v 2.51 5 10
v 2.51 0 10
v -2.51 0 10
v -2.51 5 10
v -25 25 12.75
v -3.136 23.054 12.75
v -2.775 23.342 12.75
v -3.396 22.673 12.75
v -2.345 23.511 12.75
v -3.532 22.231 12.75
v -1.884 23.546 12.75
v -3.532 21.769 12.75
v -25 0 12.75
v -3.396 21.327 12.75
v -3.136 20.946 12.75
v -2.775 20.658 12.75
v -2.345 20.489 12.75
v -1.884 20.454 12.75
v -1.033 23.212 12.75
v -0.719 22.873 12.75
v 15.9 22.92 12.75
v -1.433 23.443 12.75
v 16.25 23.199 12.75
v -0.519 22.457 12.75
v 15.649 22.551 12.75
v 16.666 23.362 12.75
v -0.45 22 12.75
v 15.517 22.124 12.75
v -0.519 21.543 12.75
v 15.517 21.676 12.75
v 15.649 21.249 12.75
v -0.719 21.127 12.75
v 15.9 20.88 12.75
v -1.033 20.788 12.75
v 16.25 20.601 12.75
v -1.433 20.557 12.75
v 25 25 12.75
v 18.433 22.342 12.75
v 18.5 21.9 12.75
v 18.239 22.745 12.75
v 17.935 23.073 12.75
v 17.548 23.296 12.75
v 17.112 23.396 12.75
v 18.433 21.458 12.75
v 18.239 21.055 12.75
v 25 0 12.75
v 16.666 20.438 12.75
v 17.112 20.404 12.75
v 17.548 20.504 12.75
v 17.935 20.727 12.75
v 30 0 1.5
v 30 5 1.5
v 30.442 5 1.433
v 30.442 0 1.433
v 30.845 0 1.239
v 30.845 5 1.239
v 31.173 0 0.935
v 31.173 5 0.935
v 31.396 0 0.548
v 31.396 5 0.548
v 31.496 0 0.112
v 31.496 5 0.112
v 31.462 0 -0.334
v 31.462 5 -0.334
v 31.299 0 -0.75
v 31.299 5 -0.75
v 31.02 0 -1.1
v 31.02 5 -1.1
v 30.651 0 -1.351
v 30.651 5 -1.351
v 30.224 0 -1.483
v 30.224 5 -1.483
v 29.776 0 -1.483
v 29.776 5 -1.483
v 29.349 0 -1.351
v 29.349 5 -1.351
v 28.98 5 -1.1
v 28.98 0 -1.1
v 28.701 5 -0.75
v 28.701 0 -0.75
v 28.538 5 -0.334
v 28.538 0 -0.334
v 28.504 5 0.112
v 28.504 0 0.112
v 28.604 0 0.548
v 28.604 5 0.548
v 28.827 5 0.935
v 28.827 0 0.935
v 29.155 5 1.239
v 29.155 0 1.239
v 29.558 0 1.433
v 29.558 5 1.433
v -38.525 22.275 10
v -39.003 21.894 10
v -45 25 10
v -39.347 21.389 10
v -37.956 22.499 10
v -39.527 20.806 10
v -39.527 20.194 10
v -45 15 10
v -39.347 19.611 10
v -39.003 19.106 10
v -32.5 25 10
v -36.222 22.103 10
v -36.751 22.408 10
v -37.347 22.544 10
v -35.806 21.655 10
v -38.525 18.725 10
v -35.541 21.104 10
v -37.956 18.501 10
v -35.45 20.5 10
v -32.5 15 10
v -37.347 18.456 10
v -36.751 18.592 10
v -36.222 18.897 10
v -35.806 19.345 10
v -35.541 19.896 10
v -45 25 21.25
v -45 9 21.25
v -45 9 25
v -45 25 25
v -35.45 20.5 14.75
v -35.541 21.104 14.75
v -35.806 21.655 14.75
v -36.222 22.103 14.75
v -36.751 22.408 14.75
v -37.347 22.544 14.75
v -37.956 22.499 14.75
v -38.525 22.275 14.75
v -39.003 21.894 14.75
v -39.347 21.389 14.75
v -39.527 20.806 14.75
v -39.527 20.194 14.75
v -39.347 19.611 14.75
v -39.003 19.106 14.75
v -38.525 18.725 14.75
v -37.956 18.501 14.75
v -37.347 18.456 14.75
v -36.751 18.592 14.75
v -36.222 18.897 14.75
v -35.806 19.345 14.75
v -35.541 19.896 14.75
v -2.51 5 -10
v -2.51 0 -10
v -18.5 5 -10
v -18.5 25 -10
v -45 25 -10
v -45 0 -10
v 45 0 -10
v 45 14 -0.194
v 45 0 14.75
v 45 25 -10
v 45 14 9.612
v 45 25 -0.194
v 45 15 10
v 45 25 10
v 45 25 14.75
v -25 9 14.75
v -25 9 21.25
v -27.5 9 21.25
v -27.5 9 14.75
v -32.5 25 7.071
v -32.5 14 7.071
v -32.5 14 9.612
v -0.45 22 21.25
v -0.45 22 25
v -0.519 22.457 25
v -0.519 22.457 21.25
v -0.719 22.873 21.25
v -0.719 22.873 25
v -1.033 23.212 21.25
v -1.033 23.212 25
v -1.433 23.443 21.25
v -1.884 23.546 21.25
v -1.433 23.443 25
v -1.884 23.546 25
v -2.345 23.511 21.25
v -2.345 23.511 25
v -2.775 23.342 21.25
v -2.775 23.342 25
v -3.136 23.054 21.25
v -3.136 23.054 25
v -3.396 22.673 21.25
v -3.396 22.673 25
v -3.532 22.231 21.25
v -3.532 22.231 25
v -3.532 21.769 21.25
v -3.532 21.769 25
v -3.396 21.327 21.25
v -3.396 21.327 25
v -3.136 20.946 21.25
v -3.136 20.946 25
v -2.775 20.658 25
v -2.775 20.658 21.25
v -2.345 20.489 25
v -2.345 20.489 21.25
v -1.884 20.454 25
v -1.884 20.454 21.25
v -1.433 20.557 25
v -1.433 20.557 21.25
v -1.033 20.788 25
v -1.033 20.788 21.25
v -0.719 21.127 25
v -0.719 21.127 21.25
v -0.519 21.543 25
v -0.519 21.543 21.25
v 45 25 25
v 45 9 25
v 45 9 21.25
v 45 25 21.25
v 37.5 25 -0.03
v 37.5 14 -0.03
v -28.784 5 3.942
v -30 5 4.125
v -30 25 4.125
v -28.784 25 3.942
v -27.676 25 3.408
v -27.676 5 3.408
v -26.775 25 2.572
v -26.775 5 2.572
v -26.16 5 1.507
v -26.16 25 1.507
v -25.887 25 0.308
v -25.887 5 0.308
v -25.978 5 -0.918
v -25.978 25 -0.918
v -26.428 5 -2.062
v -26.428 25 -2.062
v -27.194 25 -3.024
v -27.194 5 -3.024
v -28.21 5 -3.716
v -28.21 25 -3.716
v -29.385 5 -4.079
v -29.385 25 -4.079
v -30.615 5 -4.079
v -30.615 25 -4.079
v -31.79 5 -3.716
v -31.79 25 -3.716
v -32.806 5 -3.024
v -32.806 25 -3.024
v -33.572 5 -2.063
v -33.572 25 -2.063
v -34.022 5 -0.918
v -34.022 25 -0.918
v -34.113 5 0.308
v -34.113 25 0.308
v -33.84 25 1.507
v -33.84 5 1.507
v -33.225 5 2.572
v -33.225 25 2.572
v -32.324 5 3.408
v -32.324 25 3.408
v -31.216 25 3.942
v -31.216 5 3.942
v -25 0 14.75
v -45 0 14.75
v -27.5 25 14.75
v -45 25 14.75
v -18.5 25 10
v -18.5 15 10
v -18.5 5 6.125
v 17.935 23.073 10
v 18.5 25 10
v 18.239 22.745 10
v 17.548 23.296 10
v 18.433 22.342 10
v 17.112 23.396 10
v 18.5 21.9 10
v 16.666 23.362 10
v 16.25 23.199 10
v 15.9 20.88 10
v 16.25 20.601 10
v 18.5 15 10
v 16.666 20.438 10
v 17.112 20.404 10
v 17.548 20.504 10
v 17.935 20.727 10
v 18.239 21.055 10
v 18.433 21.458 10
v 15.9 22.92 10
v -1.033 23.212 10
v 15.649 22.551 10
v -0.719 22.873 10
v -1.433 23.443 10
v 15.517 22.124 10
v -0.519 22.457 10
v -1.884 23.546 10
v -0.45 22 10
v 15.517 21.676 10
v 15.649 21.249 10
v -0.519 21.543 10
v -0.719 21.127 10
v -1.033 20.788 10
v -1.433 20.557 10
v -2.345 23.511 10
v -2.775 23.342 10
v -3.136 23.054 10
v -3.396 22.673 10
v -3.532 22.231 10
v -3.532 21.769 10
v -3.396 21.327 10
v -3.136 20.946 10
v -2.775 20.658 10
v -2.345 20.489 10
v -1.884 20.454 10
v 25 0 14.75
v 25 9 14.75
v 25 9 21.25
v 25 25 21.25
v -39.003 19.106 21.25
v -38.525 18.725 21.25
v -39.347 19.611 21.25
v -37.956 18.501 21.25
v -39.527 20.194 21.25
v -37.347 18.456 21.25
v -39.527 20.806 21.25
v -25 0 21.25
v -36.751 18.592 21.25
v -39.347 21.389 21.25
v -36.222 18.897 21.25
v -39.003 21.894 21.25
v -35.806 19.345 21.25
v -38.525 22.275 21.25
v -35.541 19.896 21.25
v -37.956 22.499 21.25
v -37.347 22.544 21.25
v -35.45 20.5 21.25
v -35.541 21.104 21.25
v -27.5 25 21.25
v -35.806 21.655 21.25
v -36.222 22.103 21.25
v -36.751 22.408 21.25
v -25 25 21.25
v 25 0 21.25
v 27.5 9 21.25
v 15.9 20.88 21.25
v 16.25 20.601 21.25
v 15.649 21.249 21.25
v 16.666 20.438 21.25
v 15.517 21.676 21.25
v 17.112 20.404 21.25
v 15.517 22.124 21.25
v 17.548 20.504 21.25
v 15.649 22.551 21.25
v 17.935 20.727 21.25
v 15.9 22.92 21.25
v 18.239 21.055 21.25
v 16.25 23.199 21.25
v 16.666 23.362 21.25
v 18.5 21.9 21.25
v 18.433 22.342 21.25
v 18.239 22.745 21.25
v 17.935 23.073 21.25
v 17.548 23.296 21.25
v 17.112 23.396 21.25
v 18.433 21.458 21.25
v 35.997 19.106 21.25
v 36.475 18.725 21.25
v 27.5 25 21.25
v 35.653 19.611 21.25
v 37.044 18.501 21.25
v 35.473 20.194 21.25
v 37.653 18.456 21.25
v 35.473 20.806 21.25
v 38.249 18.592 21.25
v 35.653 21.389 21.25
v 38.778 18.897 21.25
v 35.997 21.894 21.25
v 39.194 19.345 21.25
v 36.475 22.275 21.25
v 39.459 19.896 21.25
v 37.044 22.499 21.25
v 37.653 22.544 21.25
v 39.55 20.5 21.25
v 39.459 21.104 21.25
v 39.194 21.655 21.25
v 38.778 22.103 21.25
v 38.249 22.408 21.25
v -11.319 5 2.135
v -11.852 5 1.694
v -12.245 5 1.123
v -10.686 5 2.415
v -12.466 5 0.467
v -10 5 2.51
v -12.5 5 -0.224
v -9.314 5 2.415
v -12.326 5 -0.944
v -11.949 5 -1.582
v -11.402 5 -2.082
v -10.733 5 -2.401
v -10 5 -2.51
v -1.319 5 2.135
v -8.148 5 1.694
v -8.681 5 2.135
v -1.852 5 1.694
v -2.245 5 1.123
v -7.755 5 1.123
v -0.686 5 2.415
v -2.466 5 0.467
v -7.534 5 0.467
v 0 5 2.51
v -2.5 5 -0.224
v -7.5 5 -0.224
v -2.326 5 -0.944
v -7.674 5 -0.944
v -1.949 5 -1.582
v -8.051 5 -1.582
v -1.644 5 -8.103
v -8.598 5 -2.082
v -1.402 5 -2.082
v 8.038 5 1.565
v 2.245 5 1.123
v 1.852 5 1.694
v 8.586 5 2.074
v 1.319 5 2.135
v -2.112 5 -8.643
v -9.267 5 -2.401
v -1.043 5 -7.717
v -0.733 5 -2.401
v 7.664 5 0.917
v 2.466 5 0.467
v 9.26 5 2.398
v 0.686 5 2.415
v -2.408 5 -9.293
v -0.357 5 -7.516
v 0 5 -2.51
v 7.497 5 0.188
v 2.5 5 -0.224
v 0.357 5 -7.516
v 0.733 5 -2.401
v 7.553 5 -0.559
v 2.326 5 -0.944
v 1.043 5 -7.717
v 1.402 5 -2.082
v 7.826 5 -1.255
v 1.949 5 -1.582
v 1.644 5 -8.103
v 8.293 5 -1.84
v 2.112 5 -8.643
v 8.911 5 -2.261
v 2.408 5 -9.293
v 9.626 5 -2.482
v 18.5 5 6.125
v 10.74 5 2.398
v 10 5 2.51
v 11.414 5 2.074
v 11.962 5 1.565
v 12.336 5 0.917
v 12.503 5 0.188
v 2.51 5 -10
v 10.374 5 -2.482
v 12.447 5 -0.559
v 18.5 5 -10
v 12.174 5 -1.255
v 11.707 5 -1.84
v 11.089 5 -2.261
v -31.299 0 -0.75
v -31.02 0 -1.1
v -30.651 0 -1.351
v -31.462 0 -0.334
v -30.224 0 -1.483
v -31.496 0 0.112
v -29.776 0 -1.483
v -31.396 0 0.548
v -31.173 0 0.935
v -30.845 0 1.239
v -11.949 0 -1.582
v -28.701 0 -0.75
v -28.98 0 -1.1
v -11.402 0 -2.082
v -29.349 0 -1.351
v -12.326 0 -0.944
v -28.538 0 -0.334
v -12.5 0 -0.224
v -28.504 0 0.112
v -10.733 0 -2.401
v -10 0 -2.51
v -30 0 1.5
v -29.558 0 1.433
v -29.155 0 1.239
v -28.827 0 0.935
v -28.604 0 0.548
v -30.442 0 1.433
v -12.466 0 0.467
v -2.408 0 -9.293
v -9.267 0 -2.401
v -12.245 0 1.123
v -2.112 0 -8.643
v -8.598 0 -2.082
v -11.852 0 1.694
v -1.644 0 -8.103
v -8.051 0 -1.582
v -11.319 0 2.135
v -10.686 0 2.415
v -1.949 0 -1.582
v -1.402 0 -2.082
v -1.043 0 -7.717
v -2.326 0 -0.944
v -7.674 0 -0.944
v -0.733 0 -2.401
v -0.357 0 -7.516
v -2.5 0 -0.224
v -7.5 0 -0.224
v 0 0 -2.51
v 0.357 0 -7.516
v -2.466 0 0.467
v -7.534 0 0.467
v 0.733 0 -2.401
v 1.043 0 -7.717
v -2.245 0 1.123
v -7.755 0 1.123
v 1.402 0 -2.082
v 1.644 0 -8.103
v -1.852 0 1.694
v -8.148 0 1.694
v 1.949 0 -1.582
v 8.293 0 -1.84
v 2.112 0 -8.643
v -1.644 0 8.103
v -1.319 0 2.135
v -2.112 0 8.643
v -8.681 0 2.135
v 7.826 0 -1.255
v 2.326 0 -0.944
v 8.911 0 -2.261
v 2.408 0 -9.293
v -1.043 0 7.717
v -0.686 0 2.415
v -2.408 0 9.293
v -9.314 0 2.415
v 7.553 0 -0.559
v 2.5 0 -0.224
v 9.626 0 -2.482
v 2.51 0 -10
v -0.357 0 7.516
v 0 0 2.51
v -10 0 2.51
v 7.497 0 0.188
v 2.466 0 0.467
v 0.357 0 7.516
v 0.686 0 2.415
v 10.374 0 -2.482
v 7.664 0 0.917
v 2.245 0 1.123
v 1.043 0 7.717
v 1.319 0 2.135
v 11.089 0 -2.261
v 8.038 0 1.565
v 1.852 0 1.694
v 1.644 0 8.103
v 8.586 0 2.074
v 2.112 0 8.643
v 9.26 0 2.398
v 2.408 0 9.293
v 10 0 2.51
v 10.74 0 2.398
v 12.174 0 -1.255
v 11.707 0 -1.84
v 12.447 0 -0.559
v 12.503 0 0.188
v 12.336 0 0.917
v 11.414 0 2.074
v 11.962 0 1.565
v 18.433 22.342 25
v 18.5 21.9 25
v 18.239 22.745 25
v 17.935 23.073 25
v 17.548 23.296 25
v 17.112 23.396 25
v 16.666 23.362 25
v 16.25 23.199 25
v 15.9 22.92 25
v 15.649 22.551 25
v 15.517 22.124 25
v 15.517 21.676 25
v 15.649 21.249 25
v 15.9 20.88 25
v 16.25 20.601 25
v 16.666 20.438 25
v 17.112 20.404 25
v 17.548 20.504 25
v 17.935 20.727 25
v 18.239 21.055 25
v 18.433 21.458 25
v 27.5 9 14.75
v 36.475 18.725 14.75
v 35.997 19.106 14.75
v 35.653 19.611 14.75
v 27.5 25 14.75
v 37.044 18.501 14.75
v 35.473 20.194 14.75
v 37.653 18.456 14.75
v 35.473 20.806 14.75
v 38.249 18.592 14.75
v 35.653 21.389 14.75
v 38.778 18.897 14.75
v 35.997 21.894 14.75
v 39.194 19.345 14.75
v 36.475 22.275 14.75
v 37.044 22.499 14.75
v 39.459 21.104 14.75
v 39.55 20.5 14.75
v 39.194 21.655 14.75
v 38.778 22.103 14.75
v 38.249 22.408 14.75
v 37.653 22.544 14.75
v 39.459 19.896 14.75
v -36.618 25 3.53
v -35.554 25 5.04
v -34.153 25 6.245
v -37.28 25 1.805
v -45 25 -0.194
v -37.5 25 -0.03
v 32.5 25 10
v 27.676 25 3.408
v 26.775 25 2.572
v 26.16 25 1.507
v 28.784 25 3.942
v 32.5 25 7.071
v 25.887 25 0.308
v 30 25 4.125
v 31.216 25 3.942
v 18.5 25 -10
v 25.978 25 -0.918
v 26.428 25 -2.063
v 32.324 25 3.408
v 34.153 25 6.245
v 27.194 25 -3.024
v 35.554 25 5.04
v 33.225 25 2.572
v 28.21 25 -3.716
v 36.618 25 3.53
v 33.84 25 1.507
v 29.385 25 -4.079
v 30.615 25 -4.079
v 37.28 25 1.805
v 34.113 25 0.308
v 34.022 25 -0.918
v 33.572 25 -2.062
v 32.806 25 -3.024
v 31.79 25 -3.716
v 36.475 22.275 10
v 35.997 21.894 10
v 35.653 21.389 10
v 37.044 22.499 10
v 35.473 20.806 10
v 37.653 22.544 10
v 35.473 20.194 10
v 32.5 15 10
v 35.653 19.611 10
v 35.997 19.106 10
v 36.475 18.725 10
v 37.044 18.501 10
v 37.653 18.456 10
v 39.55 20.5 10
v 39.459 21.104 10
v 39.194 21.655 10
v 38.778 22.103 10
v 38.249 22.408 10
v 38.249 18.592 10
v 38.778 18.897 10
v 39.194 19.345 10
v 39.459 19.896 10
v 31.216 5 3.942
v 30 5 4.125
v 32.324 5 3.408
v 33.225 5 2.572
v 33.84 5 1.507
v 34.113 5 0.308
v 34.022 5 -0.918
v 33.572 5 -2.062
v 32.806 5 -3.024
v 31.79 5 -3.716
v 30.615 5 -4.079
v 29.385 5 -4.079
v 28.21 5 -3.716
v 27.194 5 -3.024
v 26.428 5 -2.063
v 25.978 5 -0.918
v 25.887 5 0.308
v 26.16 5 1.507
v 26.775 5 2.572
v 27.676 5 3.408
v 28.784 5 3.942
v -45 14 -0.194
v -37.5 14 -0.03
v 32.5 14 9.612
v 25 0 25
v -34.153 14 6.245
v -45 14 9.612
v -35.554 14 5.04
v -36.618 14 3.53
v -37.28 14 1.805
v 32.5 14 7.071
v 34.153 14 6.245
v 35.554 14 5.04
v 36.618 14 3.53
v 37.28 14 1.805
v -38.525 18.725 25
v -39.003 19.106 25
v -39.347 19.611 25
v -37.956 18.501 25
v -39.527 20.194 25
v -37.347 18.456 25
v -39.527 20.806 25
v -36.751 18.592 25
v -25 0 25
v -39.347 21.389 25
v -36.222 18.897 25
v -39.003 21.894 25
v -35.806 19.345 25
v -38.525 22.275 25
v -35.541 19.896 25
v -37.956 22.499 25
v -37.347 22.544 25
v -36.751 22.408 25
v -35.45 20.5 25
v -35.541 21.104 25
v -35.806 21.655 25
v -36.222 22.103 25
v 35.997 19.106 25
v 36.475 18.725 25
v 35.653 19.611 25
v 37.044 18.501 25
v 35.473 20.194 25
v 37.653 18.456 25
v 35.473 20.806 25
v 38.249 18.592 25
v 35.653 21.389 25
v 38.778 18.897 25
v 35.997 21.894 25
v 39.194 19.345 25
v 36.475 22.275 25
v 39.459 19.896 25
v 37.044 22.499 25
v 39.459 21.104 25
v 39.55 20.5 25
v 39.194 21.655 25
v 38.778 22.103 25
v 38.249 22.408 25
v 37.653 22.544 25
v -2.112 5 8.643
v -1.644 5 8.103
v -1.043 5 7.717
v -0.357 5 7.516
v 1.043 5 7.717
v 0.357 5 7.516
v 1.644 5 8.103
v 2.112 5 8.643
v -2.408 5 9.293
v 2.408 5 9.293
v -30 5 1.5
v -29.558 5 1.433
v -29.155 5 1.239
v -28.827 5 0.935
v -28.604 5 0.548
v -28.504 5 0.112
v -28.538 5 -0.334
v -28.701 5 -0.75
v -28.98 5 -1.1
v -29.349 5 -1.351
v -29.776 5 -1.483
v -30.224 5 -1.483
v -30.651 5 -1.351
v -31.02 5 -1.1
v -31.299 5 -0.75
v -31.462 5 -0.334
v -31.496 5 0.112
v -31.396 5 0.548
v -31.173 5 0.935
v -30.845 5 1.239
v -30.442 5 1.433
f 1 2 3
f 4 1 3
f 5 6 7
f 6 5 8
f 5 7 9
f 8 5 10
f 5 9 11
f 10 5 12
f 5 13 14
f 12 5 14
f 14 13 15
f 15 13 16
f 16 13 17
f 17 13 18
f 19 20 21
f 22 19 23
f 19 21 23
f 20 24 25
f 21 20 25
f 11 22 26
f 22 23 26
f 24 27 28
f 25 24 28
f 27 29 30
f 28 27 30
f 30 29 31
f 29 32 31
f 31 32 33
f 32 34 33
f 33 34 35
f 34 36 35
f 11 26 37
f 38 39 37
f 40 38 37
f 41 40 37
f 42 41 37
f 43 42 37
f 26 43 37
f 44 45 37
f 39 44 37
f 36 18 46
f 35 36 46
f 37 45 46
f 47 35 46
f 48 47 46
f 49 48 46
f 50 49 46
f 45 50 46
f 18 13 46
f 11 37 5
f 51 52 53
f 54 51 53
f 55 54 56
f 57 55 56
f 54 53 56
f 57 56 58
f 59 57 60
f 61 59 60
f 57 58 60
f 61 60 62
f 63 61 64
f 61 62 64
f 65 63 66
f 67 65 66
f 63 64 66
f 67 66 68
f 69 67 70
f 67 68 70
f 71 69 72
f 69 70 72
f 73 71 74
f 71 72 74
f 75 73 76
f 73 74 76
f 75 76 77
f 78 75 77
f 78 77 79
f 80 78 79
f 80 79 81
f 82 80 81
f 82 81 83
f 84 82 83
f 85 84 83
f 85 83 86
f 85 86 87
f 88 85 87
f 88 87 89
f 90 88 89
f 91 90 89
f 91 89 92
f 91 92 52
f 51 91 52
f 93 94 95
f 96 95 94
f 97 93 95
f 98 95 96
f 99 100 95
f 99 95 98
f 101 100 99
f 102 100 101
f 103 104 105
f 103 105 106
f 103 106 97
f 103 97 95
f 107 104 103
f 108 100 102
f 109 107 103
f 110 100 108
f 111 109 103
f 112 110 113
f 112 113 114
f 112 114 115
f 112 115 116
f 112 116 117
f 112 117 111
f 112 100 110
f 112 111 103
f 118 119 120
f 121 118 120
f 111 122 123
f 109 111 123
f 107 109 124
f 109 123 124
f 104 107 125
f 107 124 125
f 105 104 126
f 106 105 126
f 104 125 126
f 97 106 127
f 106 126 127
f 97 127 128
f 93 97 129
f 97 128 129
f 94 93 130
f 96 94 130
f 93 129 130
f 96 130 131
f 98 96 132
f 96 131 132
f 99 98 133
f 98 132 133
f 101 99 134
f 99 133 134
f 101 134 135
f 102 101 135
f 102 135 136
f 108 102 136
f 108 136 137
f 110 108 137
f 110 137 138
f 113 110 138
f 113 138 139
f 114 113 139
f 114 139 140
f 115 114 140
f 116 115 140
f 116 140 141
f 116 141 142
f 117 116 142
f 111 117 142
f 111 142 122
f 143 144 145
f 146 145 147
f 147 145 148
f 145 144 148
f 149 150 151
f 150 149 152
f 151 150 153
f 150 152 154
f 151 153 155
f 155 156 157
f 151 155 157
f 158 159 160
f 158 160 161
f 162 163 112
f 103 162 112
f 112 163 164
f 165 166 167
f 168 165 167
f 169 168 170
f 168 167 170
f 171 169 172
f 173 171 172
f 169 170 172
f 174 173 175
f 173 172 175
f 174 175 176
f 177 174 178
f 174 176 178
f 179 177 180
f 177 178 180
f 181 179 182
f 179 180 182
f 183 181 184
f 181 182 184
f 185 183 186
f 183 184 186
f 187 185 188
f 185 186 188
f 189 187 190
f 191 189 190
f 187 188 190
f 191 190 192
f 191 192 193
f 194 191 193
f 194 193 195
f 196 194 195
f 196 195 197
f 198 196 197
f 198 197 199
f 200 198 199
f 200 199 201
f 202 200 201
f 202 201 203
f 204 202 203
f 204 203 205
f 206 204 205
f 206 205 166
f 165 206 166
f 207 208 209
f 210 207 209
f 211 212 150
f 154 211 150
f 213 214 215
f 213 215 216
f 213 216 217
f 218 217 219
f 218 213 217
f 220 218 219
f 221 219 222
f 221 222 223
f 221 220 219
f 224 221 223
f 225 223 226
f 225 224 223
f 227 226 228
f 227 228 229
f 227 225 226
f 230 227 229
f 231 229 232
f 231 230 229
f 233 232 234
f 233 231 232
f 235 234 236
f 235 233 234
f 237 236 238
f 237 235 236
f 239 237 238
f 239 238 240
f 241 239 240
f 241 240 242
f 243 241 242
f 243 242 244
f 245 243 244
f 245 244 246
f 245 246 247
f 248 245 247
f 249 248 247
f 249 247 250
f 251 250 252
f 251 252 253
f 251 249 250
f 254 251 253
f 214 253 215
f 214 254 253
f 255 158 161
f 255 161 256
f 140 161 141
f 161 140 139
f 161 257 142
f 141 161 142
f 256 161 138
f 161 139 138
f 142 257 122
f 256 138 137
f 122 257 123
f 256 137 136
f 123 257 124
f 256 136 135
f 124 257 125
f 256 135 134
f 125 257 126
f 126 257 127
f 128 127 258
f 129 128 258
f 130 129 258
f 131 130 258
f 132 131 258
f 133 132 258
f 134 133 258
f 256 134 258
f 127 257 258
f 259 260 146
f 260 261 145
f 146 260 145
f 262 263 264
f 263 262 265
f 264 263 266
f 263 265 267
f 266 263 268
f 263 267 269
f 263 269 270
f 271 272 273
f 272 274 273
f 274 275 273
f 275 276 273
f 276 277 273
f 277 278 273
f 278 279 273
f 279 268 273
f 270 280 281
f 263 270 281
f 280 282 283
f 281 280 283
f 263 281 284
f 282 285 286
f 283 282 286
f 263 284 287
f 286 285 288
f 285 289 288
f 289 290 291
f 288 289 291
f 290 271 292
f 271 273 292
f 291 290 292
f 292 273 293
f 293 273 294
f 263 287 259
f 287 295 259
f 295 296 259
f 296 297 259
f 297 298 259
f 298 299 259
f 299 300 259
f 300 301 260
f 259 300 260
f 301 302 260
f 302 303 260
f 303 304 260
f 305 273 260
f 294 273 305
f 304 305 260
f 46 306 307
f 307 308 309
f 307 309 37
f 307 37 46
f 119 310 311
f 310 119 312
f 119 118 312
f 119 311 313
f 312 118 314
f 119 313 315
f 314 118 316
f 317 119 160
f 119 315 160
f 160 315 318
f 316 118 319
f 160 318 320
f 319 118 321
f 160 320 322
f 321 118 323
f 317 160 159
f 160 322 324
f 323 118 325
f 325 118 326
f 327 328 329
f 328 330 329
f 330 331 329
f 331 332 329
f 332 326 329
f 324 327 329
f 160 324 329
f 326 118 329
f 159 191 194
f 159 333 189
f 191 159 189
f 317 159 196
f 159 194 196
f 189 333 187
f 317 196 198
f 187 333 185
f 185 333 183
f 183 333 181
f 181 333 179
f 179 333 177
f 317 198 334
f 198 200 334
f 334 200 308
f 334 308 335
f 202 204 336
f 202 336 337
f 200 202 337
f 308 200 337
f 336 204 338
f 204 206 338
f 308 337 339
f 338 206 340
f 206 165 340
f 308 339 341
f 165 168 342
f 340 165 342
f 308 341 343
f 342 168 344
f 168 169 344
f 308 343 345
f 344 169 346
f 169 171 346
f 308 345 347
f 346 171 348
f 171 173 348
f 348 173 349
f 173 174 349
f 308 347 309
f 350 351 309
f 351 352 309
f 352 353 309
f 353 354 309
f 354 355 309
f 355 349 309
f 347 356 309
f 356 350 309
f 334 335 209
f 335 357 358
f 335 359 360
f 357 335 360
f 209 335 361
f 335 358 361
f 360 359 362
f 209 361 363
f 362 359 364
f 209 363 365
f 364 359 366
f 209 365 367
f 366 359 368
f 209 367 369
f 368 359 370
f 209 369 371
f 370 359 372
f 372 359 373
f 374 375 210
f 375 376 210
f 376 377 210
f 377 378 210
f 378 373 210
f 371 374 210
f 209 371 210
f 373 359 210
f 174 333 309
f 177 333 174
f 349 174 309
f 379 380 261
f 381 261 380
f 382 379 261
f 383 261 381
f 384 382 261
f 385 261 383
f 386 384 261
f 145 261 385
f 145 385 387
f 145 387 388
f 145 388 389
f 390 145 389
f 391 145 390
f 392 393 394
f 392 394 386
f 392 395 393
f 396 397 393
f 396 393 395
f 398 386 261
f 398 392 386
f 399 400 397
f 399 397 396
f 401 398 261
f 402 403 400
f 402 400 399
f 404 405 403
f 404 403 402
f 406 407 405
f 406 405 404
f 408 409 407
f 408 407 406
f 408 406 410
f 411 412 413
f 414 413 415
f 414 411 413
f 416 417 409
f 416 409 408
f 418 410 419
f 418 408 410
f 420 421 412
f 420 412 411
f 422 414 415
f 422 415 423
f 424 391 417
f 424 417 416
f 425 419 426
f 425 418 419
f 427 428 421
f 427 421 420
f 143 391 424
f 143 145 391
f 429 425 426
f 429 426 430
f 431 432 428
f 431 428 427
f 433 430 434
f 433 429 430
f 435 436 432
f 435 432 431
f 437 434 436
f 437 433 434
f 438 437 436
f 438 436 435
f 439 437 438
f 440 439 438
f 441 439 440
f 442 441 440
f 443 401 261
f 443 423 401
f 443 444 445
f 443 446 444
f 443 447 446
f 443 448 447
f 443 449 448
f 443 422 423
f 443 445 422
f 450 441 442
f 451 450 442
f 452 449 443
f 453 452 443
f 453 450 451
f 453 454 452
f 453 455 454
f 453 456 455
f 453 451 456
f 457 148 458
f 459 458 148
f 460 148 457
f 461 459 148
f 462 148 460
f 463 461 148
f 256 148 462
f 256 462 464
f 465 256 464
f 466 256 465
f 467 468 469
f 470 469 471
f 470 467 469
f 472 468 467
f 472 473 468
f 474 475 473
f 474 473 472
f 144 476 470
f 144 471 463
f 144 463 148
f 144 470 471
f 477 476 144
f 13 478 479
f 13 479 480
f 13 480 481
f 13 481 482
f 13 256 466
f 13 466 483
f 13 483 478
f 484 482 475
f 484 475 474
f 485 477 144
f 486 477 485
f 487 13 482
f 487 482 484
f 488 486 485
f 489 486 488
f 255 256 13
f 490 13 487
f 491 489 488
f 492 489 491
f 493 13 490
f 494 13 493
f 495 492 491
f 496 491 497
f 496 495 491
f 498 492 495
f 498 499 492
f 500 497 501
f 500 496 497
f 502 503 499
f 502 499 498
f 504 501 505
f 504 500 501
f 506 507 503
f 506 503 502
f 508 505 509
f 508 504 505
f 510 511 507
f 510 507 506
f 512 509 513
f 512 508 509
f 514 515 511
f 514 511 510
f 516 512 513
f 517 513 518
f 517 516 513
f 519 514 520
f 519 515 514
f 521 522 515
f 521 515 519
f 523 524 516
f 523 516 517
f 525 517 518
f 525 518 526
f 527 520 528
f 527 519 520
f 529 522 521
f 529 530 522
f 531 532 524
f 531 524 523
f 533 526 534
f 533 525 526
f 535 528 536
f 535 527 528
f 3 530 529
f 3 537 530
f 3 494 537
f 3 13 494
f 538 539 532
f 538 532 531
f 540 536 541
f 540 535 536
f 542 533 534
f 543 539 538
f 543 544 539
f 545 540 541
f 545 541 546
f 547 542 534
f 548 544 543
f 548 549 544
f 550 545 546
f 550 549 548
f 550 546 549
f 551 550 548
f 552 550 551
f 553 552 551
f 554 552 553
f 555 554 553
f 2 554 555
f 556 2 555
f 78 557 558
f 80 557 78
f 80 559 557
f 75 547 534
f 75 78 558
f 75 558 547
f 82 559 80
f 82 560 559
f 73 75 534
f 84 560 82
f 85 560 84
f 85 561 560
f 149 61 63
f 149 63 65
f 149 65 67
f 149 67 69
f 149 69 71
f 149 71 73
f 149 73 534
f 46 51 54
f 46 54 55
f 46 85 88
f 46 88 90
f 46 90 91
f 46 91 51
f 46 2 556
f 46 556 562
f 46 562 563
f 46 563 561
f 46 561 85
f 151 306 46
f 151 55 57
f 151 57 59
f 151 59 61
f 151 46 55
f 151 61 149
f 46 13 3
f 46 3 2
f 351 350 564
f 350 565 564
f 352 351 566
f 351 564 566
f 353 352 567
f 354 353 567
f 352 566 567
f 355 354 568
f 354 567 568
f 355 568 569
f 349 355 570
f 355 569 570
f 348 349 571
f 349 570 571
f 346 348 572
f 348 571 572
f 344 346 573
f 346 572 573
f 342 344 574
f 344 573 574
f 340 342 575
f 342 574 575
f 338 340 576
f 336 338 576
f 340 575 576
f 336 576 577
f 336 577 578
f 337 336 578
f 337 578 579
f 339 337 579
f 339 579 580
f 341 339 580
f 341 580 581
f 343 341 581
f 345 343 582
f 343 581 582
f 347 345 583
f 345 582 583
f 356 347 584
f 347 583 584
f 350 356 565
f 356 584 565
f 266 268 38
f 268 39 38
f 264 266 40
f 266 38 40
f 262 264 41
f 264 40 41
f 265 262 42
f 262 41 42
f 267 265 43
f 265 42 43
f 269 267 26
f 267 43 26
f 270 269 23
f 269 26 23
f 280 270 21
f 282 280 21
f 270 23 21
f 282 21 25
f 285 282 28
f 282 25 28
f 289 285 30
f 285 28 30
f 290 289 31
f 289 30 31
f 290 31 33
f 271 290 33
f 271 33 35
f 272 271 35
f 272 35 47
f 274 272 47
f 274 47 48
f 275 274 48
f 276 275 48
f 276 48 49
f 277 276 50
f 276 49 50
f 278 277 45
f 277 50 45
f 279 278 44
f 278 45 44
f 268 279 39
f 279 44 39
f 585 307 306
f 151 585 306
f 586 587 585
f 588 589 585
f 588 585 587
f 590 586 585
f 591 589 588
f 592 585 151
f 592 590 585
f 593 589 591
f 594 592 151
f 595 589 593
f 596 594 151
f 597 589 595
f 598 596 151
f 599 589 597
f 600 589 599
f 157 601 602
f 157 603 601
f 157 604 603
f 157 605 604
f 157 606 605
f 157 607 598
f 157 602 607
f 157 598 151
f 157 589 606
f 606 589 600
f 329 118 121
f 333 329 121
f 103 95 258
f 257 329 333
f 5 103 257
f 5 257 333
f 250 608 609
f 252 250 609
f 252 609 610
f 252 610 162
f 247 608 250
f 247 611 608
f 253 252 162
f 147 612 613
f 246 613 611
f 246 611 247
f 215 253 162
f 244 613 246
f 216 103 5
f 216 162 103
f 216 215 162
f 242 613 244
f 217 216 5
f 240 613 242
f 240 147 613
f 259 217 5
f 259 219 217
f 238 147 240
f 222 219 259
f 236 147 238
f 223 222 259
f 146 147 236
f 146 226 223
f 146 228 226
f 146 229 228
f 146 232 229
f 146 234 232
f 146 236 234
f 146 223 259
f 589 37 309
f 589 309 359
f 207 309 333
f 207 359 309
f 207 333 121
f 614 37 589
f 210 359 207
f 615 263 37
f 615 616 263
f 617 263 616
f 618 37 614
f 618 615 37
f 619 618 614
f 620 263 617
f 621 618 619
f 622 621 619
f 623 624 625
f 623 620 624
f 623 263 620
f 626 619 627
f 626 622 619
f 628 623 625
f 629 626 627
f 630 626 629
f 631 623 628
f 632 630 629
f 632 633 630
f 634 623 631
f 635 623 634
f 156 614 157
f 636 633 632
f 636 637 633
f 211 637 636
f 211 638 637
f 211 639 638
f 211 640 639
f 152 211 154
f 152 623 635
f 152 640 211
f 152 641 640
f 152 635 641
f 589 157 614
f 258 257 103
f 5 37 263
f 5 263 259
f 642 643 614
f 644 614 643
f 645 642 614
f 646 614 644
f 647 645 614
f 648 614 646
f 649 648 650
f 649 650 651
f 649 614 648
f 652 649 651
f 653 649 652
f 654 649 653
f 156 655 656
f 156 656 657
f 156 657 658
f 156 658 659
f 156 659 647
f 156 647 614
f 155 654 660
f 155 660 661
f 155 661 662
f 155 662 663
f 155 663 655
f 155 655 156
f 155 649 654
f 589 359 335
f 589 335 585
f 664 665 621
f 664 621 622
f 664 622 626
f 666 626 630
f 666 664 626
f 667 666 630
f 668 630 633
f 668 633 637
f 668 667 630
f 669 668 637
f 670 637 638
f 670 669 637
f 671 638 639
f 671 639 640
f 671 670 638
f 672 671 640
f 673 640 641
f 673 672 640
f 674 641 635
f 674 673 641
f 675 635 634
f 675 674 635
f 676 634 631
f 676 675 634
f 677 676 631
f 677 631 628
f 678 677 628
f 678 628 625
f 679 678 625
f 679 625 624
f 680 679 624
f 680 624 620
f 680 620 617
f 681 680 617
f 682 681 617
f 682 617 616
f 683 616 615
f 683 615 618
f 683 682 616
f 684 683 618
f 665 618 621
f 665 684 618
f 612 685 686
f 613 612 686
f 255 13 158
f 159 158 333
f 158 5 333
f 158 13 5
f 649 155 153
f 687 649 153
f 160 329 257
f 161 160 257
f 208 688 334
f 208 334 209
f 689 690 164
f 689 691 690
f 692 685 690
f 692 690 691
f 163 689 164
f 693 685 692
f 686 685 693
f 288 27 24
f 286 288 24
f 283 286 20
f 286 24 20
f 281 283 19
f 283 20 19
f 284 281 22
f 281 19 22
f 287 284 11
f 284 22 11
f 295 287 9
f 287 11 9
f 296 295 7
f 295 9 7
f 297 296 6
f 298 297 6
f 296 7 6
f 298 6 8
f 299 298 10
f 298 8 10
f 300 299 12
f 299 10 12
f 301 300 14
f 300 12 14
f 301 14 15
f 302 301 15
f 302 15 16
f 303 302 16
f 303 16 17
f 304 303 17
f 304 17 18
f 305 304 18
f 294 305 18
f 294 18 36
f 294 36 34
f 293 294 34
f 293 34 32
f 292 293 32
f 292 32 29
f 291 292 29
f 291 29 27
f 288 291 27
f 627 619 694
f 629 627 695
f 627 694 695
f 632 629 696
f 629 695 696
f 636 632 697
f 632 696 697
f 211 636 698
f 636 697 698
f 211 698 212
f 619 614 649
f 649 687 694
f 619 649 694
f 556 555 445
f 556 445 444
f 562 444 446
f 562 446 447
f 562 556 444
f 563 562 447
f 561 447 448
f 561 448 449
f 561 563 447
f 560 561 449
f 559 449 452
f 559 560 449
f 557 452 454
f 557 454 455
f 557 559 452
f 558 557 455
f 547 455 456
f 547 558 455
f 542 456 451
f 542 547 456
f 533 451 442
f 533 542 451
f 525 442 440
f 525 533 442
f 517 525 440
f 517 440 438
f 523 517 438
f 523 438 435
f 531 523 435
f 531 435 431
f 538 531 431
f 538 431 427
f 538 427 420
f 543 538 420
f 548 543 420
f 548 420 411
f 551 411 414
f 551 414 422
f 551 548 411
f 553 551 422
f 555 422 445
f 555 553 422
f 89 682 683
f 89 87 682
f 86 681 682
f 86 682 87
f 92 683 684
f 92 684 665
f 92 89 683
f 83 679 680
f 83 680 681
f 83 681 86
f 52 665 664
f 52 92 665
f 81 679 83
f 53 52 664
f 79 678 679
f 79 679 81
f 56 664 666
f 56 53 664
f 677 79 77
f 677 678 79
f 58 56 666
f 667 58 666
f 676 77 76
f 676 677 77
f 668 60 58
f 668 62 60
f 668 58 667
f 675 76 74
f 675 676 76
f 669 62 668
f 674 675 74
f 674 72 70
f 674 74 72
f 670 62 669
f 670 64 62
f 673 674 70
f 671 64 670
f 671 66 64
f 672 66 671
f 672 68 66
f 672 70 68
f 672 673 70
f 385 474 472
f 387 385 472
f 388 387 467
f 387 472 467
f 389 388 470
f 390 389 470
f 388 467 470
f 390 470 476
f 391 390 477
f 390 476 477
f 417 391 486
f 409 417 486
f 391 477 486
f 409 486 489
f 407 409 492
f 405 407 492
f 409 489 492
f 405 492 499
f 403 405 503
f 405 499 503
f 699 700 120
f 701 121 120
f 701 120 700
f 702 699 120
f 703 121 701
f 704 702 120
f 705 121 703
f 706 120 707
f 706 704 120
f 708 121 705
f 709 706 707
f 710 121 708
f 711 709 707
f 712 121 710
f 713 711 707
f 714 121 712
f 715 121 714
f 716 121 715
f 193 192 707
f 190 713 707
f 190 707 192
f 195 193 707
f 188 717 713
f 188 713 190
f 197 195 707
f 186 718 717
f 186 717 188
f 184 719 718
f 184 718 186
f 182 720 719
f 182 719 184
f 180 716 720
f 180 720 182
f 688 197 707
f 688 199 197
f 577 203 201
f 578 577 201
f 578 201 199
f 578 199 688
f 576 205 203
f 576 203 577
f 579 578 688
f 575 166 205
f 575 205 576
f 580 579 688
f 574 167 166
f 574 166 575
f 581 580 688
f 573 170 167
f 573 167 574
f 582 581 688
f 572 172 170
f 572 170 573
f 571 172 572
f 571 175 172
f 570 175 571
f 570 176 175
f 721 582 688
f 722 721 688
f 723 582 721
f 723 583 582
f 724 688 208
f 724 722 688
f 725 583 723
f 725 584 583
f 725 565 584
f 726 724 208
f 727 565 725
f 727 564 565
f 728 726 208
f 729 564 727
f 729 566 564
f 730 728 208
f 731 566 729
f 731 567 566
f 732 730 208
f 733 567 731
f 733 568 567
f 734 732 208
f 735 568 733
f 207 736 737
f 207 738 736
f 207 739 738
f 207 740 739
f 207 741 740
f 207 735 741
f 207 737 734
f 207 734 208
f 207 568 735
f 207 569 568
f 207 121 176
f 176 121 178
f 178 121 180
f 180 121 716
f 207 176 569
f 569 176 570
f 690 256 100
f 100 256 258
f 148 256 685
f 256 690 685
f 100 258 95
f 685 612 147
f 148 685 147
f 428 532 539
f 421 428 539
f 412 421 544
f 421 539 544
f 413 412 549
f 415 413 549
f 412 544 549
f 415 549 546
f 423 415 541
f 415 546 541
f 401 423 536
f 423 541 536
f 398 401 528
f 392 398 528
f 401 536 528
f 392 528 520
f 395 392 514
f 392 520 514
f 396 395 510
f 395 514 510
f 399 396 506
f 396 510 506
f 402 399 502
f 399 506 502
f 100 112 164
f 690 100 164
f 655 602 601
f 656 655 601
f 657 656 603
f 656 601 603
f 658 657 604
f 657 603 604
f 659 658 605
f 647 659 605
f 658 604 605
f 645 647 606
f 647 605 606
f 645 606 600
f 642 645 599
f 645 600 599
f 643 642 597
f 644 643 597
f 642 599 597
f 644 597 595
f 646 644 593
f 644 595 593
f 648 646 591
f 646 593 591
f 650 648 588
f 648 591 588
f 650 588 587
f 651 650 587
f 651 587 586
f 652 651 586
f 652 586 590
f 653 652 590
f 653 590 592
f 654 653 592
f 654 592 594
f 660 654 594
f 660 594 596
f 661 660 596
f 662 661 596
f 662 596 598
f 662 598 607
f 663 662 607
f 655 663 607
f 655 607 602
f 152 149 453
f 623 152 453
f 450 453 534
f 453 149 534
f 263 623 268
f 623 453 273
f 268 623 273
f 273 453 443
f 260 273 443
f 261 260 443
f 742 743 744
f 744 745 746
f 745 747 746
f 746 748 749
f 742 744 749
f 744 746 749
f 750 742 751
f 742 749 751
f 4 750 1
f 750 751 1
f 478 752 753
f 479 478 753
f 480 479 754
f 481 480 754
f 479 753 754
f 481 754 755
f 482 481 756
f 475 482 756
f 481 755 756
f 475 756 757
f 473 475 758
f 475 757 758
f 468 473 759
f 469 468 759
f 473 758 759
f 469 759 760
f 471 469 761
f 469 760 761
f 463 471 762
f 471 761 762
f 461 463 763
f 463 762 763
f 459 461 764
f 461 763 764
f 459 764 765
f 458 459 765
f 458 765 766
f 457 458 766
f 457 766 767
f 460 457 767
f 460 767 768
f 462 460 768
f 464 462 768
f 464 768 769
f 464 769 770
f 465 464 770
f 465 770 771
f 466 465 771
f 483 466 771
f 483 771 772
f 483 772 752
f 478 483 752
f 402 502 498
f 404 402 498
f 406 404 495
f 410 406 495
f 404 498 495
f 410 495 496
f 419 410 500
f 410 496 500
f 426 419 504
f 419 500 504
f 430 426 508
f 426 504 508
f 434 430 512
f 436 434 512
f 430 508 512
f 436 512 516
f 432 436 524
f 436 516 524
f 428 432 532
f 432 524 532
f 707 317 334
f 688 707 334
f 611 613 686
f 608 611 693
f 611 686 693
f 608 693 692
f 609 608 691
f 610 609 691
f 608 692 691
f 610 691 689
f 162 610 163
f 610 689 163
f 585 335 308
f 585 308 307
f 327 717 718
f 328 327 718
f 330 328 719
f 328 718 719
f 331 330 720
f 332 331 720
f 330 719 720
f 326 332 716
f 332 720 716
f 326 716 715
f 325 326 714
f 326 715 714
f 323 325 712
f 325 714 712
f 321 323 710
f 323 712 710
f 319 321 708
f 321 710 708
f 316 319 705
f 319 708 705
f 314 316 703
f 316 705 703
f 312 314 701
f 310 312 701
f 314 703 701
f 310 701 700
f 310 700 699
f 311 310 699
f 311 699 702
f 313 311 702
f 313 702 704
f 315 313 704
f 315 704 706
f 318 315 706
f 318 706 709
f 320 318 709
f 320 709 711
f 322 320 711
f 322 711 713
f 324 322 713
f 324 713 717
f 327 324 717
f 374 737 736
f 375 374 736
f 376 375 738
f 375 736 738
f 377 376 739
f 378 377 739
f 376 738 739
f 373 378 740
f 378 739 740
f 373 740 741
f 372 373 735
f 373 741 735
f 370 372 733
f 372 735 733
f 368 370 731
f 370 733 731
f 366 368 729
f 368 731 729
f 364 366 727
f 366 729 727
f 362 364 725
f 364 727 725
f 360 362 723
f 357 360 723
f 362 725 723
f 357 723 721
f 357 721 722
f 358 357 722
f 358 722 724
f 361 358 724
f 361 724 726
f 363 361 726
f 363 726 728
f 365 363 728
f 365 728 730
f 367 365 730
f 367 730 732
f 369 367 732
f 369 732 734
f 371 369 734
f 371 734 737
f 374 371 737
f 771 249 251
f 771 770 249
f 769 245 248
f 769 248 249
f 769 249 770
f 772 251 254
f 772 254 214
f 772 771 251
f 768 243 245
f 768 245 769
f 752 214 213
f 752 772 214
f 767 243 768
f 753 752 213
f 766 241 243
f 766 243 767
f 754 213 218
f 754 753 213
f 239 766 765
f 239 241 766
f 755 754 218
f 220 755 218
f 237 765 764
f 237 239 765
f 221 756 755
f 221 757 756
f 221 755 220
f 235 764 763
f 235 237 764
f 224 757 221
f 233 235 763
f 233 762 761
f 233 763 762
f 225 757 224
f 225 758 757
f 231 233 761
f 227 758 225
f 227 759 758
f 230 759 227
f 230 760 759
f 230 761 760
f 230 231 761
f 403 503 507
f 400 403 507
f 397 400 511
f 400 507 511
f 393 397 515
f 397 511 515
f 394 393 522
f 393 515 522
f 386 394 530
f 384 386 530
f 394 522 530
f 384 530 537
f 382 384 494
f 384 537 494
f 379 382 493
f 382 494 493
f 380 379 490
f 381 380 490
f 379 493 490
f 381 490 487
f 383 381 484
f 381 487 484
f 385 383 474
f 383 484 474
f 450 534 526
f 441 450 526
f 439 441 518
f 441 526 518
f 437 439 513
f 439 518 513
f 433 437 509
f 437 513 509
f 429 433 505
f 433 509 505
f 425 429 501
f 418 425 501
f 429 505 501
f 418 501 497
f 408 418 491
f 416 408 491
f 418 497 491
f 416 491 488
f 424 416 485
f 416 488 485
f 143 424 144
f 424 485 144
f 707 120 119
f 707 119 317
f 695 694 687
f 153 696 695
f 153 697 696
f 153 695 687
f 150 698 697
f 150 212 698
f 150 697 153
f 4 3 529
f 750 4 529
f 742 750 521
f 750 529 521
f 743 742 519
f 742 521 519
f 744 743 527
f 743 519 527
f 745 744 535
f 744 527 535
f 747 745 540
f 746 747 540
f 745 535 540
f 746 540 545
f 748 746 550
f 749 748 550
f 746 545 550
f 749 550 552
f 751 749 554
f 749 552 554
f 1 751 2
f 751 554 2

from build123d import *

# Parameters (mm, degrees)
SKETCH1_R               = 2.51
BOSS_EXTRUDE1_DEPTH     = 5
SKETCH2_R               = 6.125
SKETCH2_R_2             = 4.125
BOSS_EXTRUDE2_DEPTH     = 20
SKETCH1_3_W             = 20
SKETCH1_3_H             = 15
BOSS_EXTRUDE3_DEPTH     = 25
SKETCH3_W               = 17.5
SKETCH3_H               = 6.5
CUT_EXTRUDE2_DEPTH      = 21.5
CUT_EXTRUDE3_REACH      = 64.249
SKETCH4_R               = 2.05
SKETCH5_W               = 13.25
SKETCH5_H               = 9
CUT_EXTRUDE4_DEPTH      = 97.695397829
BOSS_EXTRUDE4_DEPTH     = 90
SKETCH9_R               = 1.5
CUT_EXTRUDE6_DEPTH      = 56.226804735
BOSS_EXTRUDE9_OUTLINE_W = 26.5
BOSS_EXTRUDE9_OUTLINE_H = 20
BOSS_EXTRUDE9_OUTLINE_R = 6.125
BOSS_EXTRUDE9_DEPTH     = 9
SKETCH12_R              = 7.5
SKETCH12_R_2            = 6.125
SKETCH12_W              = 5
SKETCH12_H              = 0.387499923
BOSS_EXTRUDE10_DEPTH    = 11
BOSS_EXTRUDE11_START    = -25
SKETCH13_W              = 50
SKETCH13_H              = 3.75
BOSS_EXTRUDE11_DEPTH    = 25
BOSS_EXTRUDE12_DEPTH    = 9
BOSS_EXTRUDE13_DEPTH    = 3.75
SKETCH16_R              = 1.55
SKETCH16_R_2            = 1.5
CUT_EXTRUDE7_DEPTH      = 38


# Read off the part's stored shape, not the designer's step: Boss-Extrude9
with BuildPart() as part:
    # Sketch1 → Boss-Extrude1 (new body)
    with BuildSketch(Plane(origin=(0, 0, 0), x_dir=(1, 0, 0), z_dir=(0, 1, 0))):
        with BuildLine():
            ThreePointArc((-2.51, -9.999999226), (0, -7.489999226), (2.51, -9.999999226))
            Line((2.51, -9.999999226), (45, -9.999999226))
            Line((45, -9.999999226), (45, 10.000000774))
            Line((45, 10.000000774), (2.51, 10.000000774))
            ThreePointArc((2.51, 10.000000774), (0, 7.490000774), (-2.51, 10.000000774))
            Line((-2.51, 10.000000774), (-45, 10.000000774))
            Line((-45, 10.000000774), (-45, -9.999999226))
            Line((-45, -9.999999226), (-2.51, -9.999999226))
        make_face()
        with BuildLine():
            ThreePointArc((-7.500032569, 0.22419454), (-10, -2.509999226), (-12.499967431, 0.22419454))
            ThreePointArc((-12.499967431, 0.22419454), (-10, 2.510000774), (-7.500032569, 0.22419454))
        make_face(mode=Mode.SUBTRACT)
        with BuildLine():
            ThreePointArc((2.499967431, 0.22419454), (0, -2.509999226), (-2.499967431, 0.22419454))
            ThreePointArc((-2.499967431, 0.22419454), (0, 2.510000774), (2.499967431, 0.22419454))
        make_face(mode=Mode.SUBTRACT)
        with Locations(Location((10, 7.74e-07, 0), (0, 0, 270))):
            Circle(SKETCH1_R, mode=Mode.SUBTRACT)
    extrude(amount=BOSS_EXTRUDE1_DEPTH)

    # Sketch2 → Boss-Extrude2 (add)
    # profile 1 of 2: a face of its own
    with BuildSketch(Plane(origin=(0, 5, 0), x_dir=(1, 0, 0), z_dir=(0, 1, 0))):
        with Locations(Location((-30, 0, 0), (0, 0, 270))):
            Circle(SKETCH2_R)
        with Locations(Location((-30, 0, 0), (0, 0, 270))):
            Circle(SKETCH2_R_2, mode=Mode.SUBTRACT)
    # profile 2 of 2: a face of its own
    with BuildSketch(Plane(origin=(0, 5, 0), x_dir=(1, 0, 0), z_dir=(0, 1, 0))):
        with Locations(Location((30, 0, 0), (0, 0, 270))):
            Circle(SKETCH2_R)
        with Locations(Location((30, 0, 0), (0, 0, 270))):
            Circle(SKETCH2_R_2, mode=Mode.SUBTRACT)
    extrude(amount=BOSS_EXTRUDE2_DEPTH)

    # Sketch1<3> → Boss-Extrude3 (add)
    with BuildSketch(Plane(origin=(0, 0, 0), x_dir=(1, 0, 0), z_dir=(0, 1, 0))):
        with Locations((35, -17.499999226)):
            Rectangle(SKETCH1_3_W, SKETCH1_3_H)
        with Locations((-35, -17.499999226)):
            Rectangle(SKETCH1_3_W, SKETCH1_3_H)
    extrude(amount=BOSS_EXTRUDE3_DEPTH)

    # Sketch3 → Cut-Extrude2 (cut)
    with BuildSketch(Plane(origin=(0, 25, 0), x_dir=(1, 0, 0), z_dir=(0, 1, 0))):
        with Locations((36.25, -17.999999226)):
            Rectangle(SKETCH3_W, SKETCH3_H)
        with Locations((-36.25, -17.999999226)):
            Rectangle(SKETCH3_W, SKETCH3_H)
    extrude(amount=-CUT_EXTRUDE2_DEPTH, mode=Mode.SUBTRACT)

    # Cut-Extrude3: up to this face of the body (flat: up to its plane)
    cut_extrude3_end = Plane(part.part.faces().sort_by_distance((35, 15, 9.999999226))[0])
    # Sketch4 → Cut-Extrude3 (cut, up to the picked face)
    with BuildSketch(Plane.XY.offset(24.999999226), mode=Mode.PRIVATE) as cut_extrude3_sk1:
        with Locations((37.5, 20.5)):
            Circle(SKETCH4_R)
    cut_extrude3_tool1 = split(extrude(cut_extrude3_sk1.sketch, amount=-CUT_EXTRUDE3_REACH, mode=Mode.PRIVATE), bisect_by=cut_extrude3_end, keep=Keep.BOTH, mode=Mode.PRIVATE)
    # Sketch4 → Cut-Extrude3 (cut, up to the picked face)
    with BuildSketch(Plane.XY.offset(24.999999226), mode=Mode.PRIVATE) as cut_extrude3_sk2:
        with Locations((-37.5, 20.5)):
            Circle(SKETCH4_R)
    cut_extrude3_tool2 = split(extrude(cut_extrude3_sk2.sketch, amount=-CUT_EXTRUDE3_REACH, mode=Mode.PRIVATE), bisect_by=cut_extrude3_end, keep=Keep.BOTH, mode=Mode.PRIVATE)
    add(cut_extrude3_tool1.solids().sort_by(Axis((37.5, 20.5, 24.999999), (0, 0, -1)))[0], mode=Mode.SUBTRACT)
    add(cut_extrude3_tool2.solids().sort_by(Axis((-37.5, 20.5, 24.999999), (0, 0, -1)))[0], mode=Mode.SUBTRACT)

    # Sketch5 → Cut-Extrude4 (cut, through all)
    with BuildSketch(Plane(origin=(45, 0, 0), x_dir=(0, 0, -1), z_dir=(1, 0, 0))):
        with Locations((-18.374999226, 4.5)):
            Rectangle(SKETCH5_W, SKETCH5_H)
    extrude(amount=-CUT_EXTRUDE4_DEPTH, mode=Mode.SUBTRACT)

    # Sketch6 → Boss-Extrude4 (add, through all)
    with BuildSketch(Plane(origin=(45, 0, 0), x_dir=(0, 0, -1), z_dir=(1, 0, 0))):
        Polygon((-9.999999226, 15), (-6.125, 5), (-9.999999226, 5), align=None)
    extrude(amount=-BOSS_EXTRUDE4_DEPTH)

    # Sketch9 → Cut-Extrude6 (cut, through all)
    with BuildSketch(Plane(origin=(0, 5, 0), x_dir=(1, 0, 0), z_dir=(0, 1, 0))):
        with Locations(Location((30, 0, 0), (0, 0, 270))):
            Circle(SKETCH9_R)
        with Locations(Location((-30, 0, 0), (0, 0, 270))):
            Circle(SKETCH9_R)
    extrude(amount=-CUT_EXTRUDE6_DEPTH, mode=Mode.SUBTRACT)

    # Boss-Extrude9 outline → Boss-Extrude9 (add)
    # profile 1 of 2: a face of its own
    with BuildSketch(Plane(origin=(0, 5, 0), x_dir=(1, 0, 0), z_dir=(0, 1, 0))):
        with Locations((-31.75, 7.74e-07)):
            Rectangle(BOSS_EXTRUDE9_OUTLINE_W, BOSS_EXTRUDE9_OUTLINE_H)
        with Locations((-30, 0)):
            Circle(BOSS_EXTRUDE9_OUTLINE_R, mode=Mode.SUBTRACT)
    # profile 2 of 2: a face of its own
    with BuildSketch(Plane(origin=(0, 5, 0), x_dir=(1, 0, 0), z_dir=(0, 1, 0))):
        with Locations((31.75, 7.74e-07)):
            Rectangle(BOSS_EXTRUDE9_OUTLINE_W, BOSS_EXTRUDE9_OUTLINE_H)
        with Locations((30, 0)):
            Circle(BOSS_EXTRUDE9_OUTLINE_R, mode=Mode.SUBTRACT)
    extrude(amount=BOSS_EXTRUDE9_DEPTH)

    # Sketch12 → Boss-Extrude10 (add)
    # profile 1 of 8: a face of its own
    with BuildSketch(Plane(origin=(0, 14, 0), x_dir=(1, 0, 0), z_dir=(0, 1, 0))):
        with BuildLine():
            Line((32.5, -9.612499303), (32.5, -7.071067812))
            ThreePointArc((32.5, -7.071067812), (30, -7.5), (27.5, -7.071067812))
            Line((27.5, -7.071067812), (27.5, -9.612499303))
            Line((27.5, -9.612499303), (32.5, -9.612499303))
        make_face()
    # profile 2 of 8: a face of its own
    with BuildSketch(Plane(origin=(0, 14, 0), x_dir=(1, 0, 0), z_dir=(0, 1, 0))):
        with Locations((30, 0)):
            Circle(SKETCH12_R)
        with Locations((30, 0)):
            Circle(SKETCH12_R_2, mode=Mode.SUBTRACT)
    # profile 3 of 8: a face of its own
    with BuildSketch(Plane(origin=(0, 14, 0), x_dir=(1, 0, 0), z_dir=(0, 1, 0))):
        with BuildLine():
            Line((-32.5, -7.071067812), (-32.5, -9.999999226))
            Line((-32.5, -9.999999226), (-27.5, -9.999999226))
            Line((-27.5, -9.999999226), (-27.5, -7.071067812))
            ThreePointArc((-27.5, -7.071067812), (-30, -7.5), (-32.5, -7.071067812))
        make_face()
    # profile 4 of 8: a face of its own
    with BuildSketch(Plane(origin=(0, 14, 0), x_dir=(1, 0, 0), z_dir=(0, 1, 0))):
        with Locations((-30, 0)):
            Circle(SKETCH12_R)
        with Locations((-30, 0)):
            Circle(SKETCH12_R_2, mode=Mode.SUBTRACT)
    # profile 5 of 8: a face of its own
    with BuildSketch(Plane(origin=(0, 14, 0), x_dir=(1, 0, 0), z_dir=(0, 1, 0))):
        with Locations((30, -9.806249264)):
            Rectangle(SKETCH12_W, SKETCH12_H)
    # profile 6 of 8: a face of its own
    with BuildSketch(Plane(origin=(0, 14, 0), x_dir=(1, 0, 0), z_dir=(0, 1, 0))):
        with BuildLine():
            Line((27.5, -9.612499303), (27.5, -7.071067812))
            ThreePointArc((27.5, -7.071067812), (25.657627479, 6.115047088), (37.499939934, 0.030016408))
            Line((37.499939934, 0.030016408), (45, 0.193750736))
            Line((45, 0.193750736), (45, 10.000000774))
            Line((45, 10.000000774), (18.5, 10.000000774))
            Line((18.5, 10.000000774), (18.5, -9.612499303))
            Line((18.5, -9.612499303), (27.5, -9.612499303))
        make_face()
    # profile 7 of 8: a face of its own
    with BuildSketch(Plane(origin=(0, 14, 0), x_dir=(1, 0, 0), z_dir=(0, 1, 0))):
        with BuildLine():
            Line((-27.5, -7.071067812), (-27.5, -9.999999226))
            Line((-27.5, -9.999999226), (-25, -9.999999226))
            Line((-25, -9.999999226), (-18.5, -9.999999226))
            Line((-18.5, -9.999999226), (-18.5, -9.612499303))
            Line((-18.5, -9.612499303), (-18.5, 10.000000774))
            Line((-18.5, 10.000000774), (-45, 10.000000774))
            Line((-45, 10.000000774), (-45, 0.193750736))
            Line((-45, 0.193750736), (-37.499939934, 0.030016408))
            ThreePointArc((-37.499939934, 0.030016408), (-29.984991766, 7.499984984), (-22.5, 0))
            ThreePointArc((-22.5, 0), (-23.876275643, -4.330127019), (-27.5, -7.071067812))
        make_face()
    # profile 8 of 8: a face of its own
    with BuildSketch(Plane(origin=(0, 14, 0), x_dir=(1, 0, 0), z_dir=(0, 1, 0))):
        Polygon((27.5, -9.999999226), (27.5, -9.612499303), (18.5, -9.612499303), (18.5, -9.999999226), (25, -9.999999226), align=None)
    extrude(amount=BOSS_EXTRUDE10_DEPTH)

    # Sketch13 → Boss-Extrude11 (add)
    with BuildSketch(Plane(origin=(0, 25, 0), x_dir=(1, 0, 0), z_dir=(0, 1, 0)).offset(BOSS_EXTRUDE11_START)):
        with Locations((0, -23.124999226)):
            Rectangle(SKETCH13_W, SKETCH13_H)
        Polygon((25, -12.749999226), (25, -9.999999226), (18.5, -9.999999226), (-25, -9.999999226), (-25, -12.749999226), align=None)
    extrude(amount=BOSS_EXTRUDE11_DEPTH)

    # Sketch14 → Boss-Extrude12 (add)
    with BuildSketch(Plane.XZ.offset(-9)):
        Polygon((-25, 14.749999226), (-27.5, 14.749999226), (-45, 14.749999226), (-45, 11.749999226), (-25, 11.749999226), (-25, 12.749999226), align=None)
        Polygon((45, 14.749999226), (27.5, 14.749999226), (25, 14.749999226), (25, 12.749999226), (25, 11.749999226), (45, 11.749999226), align=None)
    extrude(amount=BOSS_EXTRUDE12_DEPTH)

    # Sketch15 → Boss-Extrude13 (add)
    with BuildSketch(Plane.XY.offset(24.999999226)):
        Polygon((-45, 9), (-25, 0), (-25, 9), align=None)
        Polygon((25, 0), (45, 9), (25, 9), align=None)
    extrude(amount=-BOSS_EXTRUDE13_DEPTH)

    # Sketch16 → Cut-Extrude7 (cut)
    with BuildSketch(Plane.XY.offset(24.999999226)):
        with Locations((-1.99973684, 22)):
            Circle(SKETCH16_R)
        with Locations((17, 21.9)):
            Circle(SKETCH16_R_2)
    extrude(amount=-CUT_EXTRUDE7_DEPTH, mode=Mode.SUBTRACT)


solid = part.part
